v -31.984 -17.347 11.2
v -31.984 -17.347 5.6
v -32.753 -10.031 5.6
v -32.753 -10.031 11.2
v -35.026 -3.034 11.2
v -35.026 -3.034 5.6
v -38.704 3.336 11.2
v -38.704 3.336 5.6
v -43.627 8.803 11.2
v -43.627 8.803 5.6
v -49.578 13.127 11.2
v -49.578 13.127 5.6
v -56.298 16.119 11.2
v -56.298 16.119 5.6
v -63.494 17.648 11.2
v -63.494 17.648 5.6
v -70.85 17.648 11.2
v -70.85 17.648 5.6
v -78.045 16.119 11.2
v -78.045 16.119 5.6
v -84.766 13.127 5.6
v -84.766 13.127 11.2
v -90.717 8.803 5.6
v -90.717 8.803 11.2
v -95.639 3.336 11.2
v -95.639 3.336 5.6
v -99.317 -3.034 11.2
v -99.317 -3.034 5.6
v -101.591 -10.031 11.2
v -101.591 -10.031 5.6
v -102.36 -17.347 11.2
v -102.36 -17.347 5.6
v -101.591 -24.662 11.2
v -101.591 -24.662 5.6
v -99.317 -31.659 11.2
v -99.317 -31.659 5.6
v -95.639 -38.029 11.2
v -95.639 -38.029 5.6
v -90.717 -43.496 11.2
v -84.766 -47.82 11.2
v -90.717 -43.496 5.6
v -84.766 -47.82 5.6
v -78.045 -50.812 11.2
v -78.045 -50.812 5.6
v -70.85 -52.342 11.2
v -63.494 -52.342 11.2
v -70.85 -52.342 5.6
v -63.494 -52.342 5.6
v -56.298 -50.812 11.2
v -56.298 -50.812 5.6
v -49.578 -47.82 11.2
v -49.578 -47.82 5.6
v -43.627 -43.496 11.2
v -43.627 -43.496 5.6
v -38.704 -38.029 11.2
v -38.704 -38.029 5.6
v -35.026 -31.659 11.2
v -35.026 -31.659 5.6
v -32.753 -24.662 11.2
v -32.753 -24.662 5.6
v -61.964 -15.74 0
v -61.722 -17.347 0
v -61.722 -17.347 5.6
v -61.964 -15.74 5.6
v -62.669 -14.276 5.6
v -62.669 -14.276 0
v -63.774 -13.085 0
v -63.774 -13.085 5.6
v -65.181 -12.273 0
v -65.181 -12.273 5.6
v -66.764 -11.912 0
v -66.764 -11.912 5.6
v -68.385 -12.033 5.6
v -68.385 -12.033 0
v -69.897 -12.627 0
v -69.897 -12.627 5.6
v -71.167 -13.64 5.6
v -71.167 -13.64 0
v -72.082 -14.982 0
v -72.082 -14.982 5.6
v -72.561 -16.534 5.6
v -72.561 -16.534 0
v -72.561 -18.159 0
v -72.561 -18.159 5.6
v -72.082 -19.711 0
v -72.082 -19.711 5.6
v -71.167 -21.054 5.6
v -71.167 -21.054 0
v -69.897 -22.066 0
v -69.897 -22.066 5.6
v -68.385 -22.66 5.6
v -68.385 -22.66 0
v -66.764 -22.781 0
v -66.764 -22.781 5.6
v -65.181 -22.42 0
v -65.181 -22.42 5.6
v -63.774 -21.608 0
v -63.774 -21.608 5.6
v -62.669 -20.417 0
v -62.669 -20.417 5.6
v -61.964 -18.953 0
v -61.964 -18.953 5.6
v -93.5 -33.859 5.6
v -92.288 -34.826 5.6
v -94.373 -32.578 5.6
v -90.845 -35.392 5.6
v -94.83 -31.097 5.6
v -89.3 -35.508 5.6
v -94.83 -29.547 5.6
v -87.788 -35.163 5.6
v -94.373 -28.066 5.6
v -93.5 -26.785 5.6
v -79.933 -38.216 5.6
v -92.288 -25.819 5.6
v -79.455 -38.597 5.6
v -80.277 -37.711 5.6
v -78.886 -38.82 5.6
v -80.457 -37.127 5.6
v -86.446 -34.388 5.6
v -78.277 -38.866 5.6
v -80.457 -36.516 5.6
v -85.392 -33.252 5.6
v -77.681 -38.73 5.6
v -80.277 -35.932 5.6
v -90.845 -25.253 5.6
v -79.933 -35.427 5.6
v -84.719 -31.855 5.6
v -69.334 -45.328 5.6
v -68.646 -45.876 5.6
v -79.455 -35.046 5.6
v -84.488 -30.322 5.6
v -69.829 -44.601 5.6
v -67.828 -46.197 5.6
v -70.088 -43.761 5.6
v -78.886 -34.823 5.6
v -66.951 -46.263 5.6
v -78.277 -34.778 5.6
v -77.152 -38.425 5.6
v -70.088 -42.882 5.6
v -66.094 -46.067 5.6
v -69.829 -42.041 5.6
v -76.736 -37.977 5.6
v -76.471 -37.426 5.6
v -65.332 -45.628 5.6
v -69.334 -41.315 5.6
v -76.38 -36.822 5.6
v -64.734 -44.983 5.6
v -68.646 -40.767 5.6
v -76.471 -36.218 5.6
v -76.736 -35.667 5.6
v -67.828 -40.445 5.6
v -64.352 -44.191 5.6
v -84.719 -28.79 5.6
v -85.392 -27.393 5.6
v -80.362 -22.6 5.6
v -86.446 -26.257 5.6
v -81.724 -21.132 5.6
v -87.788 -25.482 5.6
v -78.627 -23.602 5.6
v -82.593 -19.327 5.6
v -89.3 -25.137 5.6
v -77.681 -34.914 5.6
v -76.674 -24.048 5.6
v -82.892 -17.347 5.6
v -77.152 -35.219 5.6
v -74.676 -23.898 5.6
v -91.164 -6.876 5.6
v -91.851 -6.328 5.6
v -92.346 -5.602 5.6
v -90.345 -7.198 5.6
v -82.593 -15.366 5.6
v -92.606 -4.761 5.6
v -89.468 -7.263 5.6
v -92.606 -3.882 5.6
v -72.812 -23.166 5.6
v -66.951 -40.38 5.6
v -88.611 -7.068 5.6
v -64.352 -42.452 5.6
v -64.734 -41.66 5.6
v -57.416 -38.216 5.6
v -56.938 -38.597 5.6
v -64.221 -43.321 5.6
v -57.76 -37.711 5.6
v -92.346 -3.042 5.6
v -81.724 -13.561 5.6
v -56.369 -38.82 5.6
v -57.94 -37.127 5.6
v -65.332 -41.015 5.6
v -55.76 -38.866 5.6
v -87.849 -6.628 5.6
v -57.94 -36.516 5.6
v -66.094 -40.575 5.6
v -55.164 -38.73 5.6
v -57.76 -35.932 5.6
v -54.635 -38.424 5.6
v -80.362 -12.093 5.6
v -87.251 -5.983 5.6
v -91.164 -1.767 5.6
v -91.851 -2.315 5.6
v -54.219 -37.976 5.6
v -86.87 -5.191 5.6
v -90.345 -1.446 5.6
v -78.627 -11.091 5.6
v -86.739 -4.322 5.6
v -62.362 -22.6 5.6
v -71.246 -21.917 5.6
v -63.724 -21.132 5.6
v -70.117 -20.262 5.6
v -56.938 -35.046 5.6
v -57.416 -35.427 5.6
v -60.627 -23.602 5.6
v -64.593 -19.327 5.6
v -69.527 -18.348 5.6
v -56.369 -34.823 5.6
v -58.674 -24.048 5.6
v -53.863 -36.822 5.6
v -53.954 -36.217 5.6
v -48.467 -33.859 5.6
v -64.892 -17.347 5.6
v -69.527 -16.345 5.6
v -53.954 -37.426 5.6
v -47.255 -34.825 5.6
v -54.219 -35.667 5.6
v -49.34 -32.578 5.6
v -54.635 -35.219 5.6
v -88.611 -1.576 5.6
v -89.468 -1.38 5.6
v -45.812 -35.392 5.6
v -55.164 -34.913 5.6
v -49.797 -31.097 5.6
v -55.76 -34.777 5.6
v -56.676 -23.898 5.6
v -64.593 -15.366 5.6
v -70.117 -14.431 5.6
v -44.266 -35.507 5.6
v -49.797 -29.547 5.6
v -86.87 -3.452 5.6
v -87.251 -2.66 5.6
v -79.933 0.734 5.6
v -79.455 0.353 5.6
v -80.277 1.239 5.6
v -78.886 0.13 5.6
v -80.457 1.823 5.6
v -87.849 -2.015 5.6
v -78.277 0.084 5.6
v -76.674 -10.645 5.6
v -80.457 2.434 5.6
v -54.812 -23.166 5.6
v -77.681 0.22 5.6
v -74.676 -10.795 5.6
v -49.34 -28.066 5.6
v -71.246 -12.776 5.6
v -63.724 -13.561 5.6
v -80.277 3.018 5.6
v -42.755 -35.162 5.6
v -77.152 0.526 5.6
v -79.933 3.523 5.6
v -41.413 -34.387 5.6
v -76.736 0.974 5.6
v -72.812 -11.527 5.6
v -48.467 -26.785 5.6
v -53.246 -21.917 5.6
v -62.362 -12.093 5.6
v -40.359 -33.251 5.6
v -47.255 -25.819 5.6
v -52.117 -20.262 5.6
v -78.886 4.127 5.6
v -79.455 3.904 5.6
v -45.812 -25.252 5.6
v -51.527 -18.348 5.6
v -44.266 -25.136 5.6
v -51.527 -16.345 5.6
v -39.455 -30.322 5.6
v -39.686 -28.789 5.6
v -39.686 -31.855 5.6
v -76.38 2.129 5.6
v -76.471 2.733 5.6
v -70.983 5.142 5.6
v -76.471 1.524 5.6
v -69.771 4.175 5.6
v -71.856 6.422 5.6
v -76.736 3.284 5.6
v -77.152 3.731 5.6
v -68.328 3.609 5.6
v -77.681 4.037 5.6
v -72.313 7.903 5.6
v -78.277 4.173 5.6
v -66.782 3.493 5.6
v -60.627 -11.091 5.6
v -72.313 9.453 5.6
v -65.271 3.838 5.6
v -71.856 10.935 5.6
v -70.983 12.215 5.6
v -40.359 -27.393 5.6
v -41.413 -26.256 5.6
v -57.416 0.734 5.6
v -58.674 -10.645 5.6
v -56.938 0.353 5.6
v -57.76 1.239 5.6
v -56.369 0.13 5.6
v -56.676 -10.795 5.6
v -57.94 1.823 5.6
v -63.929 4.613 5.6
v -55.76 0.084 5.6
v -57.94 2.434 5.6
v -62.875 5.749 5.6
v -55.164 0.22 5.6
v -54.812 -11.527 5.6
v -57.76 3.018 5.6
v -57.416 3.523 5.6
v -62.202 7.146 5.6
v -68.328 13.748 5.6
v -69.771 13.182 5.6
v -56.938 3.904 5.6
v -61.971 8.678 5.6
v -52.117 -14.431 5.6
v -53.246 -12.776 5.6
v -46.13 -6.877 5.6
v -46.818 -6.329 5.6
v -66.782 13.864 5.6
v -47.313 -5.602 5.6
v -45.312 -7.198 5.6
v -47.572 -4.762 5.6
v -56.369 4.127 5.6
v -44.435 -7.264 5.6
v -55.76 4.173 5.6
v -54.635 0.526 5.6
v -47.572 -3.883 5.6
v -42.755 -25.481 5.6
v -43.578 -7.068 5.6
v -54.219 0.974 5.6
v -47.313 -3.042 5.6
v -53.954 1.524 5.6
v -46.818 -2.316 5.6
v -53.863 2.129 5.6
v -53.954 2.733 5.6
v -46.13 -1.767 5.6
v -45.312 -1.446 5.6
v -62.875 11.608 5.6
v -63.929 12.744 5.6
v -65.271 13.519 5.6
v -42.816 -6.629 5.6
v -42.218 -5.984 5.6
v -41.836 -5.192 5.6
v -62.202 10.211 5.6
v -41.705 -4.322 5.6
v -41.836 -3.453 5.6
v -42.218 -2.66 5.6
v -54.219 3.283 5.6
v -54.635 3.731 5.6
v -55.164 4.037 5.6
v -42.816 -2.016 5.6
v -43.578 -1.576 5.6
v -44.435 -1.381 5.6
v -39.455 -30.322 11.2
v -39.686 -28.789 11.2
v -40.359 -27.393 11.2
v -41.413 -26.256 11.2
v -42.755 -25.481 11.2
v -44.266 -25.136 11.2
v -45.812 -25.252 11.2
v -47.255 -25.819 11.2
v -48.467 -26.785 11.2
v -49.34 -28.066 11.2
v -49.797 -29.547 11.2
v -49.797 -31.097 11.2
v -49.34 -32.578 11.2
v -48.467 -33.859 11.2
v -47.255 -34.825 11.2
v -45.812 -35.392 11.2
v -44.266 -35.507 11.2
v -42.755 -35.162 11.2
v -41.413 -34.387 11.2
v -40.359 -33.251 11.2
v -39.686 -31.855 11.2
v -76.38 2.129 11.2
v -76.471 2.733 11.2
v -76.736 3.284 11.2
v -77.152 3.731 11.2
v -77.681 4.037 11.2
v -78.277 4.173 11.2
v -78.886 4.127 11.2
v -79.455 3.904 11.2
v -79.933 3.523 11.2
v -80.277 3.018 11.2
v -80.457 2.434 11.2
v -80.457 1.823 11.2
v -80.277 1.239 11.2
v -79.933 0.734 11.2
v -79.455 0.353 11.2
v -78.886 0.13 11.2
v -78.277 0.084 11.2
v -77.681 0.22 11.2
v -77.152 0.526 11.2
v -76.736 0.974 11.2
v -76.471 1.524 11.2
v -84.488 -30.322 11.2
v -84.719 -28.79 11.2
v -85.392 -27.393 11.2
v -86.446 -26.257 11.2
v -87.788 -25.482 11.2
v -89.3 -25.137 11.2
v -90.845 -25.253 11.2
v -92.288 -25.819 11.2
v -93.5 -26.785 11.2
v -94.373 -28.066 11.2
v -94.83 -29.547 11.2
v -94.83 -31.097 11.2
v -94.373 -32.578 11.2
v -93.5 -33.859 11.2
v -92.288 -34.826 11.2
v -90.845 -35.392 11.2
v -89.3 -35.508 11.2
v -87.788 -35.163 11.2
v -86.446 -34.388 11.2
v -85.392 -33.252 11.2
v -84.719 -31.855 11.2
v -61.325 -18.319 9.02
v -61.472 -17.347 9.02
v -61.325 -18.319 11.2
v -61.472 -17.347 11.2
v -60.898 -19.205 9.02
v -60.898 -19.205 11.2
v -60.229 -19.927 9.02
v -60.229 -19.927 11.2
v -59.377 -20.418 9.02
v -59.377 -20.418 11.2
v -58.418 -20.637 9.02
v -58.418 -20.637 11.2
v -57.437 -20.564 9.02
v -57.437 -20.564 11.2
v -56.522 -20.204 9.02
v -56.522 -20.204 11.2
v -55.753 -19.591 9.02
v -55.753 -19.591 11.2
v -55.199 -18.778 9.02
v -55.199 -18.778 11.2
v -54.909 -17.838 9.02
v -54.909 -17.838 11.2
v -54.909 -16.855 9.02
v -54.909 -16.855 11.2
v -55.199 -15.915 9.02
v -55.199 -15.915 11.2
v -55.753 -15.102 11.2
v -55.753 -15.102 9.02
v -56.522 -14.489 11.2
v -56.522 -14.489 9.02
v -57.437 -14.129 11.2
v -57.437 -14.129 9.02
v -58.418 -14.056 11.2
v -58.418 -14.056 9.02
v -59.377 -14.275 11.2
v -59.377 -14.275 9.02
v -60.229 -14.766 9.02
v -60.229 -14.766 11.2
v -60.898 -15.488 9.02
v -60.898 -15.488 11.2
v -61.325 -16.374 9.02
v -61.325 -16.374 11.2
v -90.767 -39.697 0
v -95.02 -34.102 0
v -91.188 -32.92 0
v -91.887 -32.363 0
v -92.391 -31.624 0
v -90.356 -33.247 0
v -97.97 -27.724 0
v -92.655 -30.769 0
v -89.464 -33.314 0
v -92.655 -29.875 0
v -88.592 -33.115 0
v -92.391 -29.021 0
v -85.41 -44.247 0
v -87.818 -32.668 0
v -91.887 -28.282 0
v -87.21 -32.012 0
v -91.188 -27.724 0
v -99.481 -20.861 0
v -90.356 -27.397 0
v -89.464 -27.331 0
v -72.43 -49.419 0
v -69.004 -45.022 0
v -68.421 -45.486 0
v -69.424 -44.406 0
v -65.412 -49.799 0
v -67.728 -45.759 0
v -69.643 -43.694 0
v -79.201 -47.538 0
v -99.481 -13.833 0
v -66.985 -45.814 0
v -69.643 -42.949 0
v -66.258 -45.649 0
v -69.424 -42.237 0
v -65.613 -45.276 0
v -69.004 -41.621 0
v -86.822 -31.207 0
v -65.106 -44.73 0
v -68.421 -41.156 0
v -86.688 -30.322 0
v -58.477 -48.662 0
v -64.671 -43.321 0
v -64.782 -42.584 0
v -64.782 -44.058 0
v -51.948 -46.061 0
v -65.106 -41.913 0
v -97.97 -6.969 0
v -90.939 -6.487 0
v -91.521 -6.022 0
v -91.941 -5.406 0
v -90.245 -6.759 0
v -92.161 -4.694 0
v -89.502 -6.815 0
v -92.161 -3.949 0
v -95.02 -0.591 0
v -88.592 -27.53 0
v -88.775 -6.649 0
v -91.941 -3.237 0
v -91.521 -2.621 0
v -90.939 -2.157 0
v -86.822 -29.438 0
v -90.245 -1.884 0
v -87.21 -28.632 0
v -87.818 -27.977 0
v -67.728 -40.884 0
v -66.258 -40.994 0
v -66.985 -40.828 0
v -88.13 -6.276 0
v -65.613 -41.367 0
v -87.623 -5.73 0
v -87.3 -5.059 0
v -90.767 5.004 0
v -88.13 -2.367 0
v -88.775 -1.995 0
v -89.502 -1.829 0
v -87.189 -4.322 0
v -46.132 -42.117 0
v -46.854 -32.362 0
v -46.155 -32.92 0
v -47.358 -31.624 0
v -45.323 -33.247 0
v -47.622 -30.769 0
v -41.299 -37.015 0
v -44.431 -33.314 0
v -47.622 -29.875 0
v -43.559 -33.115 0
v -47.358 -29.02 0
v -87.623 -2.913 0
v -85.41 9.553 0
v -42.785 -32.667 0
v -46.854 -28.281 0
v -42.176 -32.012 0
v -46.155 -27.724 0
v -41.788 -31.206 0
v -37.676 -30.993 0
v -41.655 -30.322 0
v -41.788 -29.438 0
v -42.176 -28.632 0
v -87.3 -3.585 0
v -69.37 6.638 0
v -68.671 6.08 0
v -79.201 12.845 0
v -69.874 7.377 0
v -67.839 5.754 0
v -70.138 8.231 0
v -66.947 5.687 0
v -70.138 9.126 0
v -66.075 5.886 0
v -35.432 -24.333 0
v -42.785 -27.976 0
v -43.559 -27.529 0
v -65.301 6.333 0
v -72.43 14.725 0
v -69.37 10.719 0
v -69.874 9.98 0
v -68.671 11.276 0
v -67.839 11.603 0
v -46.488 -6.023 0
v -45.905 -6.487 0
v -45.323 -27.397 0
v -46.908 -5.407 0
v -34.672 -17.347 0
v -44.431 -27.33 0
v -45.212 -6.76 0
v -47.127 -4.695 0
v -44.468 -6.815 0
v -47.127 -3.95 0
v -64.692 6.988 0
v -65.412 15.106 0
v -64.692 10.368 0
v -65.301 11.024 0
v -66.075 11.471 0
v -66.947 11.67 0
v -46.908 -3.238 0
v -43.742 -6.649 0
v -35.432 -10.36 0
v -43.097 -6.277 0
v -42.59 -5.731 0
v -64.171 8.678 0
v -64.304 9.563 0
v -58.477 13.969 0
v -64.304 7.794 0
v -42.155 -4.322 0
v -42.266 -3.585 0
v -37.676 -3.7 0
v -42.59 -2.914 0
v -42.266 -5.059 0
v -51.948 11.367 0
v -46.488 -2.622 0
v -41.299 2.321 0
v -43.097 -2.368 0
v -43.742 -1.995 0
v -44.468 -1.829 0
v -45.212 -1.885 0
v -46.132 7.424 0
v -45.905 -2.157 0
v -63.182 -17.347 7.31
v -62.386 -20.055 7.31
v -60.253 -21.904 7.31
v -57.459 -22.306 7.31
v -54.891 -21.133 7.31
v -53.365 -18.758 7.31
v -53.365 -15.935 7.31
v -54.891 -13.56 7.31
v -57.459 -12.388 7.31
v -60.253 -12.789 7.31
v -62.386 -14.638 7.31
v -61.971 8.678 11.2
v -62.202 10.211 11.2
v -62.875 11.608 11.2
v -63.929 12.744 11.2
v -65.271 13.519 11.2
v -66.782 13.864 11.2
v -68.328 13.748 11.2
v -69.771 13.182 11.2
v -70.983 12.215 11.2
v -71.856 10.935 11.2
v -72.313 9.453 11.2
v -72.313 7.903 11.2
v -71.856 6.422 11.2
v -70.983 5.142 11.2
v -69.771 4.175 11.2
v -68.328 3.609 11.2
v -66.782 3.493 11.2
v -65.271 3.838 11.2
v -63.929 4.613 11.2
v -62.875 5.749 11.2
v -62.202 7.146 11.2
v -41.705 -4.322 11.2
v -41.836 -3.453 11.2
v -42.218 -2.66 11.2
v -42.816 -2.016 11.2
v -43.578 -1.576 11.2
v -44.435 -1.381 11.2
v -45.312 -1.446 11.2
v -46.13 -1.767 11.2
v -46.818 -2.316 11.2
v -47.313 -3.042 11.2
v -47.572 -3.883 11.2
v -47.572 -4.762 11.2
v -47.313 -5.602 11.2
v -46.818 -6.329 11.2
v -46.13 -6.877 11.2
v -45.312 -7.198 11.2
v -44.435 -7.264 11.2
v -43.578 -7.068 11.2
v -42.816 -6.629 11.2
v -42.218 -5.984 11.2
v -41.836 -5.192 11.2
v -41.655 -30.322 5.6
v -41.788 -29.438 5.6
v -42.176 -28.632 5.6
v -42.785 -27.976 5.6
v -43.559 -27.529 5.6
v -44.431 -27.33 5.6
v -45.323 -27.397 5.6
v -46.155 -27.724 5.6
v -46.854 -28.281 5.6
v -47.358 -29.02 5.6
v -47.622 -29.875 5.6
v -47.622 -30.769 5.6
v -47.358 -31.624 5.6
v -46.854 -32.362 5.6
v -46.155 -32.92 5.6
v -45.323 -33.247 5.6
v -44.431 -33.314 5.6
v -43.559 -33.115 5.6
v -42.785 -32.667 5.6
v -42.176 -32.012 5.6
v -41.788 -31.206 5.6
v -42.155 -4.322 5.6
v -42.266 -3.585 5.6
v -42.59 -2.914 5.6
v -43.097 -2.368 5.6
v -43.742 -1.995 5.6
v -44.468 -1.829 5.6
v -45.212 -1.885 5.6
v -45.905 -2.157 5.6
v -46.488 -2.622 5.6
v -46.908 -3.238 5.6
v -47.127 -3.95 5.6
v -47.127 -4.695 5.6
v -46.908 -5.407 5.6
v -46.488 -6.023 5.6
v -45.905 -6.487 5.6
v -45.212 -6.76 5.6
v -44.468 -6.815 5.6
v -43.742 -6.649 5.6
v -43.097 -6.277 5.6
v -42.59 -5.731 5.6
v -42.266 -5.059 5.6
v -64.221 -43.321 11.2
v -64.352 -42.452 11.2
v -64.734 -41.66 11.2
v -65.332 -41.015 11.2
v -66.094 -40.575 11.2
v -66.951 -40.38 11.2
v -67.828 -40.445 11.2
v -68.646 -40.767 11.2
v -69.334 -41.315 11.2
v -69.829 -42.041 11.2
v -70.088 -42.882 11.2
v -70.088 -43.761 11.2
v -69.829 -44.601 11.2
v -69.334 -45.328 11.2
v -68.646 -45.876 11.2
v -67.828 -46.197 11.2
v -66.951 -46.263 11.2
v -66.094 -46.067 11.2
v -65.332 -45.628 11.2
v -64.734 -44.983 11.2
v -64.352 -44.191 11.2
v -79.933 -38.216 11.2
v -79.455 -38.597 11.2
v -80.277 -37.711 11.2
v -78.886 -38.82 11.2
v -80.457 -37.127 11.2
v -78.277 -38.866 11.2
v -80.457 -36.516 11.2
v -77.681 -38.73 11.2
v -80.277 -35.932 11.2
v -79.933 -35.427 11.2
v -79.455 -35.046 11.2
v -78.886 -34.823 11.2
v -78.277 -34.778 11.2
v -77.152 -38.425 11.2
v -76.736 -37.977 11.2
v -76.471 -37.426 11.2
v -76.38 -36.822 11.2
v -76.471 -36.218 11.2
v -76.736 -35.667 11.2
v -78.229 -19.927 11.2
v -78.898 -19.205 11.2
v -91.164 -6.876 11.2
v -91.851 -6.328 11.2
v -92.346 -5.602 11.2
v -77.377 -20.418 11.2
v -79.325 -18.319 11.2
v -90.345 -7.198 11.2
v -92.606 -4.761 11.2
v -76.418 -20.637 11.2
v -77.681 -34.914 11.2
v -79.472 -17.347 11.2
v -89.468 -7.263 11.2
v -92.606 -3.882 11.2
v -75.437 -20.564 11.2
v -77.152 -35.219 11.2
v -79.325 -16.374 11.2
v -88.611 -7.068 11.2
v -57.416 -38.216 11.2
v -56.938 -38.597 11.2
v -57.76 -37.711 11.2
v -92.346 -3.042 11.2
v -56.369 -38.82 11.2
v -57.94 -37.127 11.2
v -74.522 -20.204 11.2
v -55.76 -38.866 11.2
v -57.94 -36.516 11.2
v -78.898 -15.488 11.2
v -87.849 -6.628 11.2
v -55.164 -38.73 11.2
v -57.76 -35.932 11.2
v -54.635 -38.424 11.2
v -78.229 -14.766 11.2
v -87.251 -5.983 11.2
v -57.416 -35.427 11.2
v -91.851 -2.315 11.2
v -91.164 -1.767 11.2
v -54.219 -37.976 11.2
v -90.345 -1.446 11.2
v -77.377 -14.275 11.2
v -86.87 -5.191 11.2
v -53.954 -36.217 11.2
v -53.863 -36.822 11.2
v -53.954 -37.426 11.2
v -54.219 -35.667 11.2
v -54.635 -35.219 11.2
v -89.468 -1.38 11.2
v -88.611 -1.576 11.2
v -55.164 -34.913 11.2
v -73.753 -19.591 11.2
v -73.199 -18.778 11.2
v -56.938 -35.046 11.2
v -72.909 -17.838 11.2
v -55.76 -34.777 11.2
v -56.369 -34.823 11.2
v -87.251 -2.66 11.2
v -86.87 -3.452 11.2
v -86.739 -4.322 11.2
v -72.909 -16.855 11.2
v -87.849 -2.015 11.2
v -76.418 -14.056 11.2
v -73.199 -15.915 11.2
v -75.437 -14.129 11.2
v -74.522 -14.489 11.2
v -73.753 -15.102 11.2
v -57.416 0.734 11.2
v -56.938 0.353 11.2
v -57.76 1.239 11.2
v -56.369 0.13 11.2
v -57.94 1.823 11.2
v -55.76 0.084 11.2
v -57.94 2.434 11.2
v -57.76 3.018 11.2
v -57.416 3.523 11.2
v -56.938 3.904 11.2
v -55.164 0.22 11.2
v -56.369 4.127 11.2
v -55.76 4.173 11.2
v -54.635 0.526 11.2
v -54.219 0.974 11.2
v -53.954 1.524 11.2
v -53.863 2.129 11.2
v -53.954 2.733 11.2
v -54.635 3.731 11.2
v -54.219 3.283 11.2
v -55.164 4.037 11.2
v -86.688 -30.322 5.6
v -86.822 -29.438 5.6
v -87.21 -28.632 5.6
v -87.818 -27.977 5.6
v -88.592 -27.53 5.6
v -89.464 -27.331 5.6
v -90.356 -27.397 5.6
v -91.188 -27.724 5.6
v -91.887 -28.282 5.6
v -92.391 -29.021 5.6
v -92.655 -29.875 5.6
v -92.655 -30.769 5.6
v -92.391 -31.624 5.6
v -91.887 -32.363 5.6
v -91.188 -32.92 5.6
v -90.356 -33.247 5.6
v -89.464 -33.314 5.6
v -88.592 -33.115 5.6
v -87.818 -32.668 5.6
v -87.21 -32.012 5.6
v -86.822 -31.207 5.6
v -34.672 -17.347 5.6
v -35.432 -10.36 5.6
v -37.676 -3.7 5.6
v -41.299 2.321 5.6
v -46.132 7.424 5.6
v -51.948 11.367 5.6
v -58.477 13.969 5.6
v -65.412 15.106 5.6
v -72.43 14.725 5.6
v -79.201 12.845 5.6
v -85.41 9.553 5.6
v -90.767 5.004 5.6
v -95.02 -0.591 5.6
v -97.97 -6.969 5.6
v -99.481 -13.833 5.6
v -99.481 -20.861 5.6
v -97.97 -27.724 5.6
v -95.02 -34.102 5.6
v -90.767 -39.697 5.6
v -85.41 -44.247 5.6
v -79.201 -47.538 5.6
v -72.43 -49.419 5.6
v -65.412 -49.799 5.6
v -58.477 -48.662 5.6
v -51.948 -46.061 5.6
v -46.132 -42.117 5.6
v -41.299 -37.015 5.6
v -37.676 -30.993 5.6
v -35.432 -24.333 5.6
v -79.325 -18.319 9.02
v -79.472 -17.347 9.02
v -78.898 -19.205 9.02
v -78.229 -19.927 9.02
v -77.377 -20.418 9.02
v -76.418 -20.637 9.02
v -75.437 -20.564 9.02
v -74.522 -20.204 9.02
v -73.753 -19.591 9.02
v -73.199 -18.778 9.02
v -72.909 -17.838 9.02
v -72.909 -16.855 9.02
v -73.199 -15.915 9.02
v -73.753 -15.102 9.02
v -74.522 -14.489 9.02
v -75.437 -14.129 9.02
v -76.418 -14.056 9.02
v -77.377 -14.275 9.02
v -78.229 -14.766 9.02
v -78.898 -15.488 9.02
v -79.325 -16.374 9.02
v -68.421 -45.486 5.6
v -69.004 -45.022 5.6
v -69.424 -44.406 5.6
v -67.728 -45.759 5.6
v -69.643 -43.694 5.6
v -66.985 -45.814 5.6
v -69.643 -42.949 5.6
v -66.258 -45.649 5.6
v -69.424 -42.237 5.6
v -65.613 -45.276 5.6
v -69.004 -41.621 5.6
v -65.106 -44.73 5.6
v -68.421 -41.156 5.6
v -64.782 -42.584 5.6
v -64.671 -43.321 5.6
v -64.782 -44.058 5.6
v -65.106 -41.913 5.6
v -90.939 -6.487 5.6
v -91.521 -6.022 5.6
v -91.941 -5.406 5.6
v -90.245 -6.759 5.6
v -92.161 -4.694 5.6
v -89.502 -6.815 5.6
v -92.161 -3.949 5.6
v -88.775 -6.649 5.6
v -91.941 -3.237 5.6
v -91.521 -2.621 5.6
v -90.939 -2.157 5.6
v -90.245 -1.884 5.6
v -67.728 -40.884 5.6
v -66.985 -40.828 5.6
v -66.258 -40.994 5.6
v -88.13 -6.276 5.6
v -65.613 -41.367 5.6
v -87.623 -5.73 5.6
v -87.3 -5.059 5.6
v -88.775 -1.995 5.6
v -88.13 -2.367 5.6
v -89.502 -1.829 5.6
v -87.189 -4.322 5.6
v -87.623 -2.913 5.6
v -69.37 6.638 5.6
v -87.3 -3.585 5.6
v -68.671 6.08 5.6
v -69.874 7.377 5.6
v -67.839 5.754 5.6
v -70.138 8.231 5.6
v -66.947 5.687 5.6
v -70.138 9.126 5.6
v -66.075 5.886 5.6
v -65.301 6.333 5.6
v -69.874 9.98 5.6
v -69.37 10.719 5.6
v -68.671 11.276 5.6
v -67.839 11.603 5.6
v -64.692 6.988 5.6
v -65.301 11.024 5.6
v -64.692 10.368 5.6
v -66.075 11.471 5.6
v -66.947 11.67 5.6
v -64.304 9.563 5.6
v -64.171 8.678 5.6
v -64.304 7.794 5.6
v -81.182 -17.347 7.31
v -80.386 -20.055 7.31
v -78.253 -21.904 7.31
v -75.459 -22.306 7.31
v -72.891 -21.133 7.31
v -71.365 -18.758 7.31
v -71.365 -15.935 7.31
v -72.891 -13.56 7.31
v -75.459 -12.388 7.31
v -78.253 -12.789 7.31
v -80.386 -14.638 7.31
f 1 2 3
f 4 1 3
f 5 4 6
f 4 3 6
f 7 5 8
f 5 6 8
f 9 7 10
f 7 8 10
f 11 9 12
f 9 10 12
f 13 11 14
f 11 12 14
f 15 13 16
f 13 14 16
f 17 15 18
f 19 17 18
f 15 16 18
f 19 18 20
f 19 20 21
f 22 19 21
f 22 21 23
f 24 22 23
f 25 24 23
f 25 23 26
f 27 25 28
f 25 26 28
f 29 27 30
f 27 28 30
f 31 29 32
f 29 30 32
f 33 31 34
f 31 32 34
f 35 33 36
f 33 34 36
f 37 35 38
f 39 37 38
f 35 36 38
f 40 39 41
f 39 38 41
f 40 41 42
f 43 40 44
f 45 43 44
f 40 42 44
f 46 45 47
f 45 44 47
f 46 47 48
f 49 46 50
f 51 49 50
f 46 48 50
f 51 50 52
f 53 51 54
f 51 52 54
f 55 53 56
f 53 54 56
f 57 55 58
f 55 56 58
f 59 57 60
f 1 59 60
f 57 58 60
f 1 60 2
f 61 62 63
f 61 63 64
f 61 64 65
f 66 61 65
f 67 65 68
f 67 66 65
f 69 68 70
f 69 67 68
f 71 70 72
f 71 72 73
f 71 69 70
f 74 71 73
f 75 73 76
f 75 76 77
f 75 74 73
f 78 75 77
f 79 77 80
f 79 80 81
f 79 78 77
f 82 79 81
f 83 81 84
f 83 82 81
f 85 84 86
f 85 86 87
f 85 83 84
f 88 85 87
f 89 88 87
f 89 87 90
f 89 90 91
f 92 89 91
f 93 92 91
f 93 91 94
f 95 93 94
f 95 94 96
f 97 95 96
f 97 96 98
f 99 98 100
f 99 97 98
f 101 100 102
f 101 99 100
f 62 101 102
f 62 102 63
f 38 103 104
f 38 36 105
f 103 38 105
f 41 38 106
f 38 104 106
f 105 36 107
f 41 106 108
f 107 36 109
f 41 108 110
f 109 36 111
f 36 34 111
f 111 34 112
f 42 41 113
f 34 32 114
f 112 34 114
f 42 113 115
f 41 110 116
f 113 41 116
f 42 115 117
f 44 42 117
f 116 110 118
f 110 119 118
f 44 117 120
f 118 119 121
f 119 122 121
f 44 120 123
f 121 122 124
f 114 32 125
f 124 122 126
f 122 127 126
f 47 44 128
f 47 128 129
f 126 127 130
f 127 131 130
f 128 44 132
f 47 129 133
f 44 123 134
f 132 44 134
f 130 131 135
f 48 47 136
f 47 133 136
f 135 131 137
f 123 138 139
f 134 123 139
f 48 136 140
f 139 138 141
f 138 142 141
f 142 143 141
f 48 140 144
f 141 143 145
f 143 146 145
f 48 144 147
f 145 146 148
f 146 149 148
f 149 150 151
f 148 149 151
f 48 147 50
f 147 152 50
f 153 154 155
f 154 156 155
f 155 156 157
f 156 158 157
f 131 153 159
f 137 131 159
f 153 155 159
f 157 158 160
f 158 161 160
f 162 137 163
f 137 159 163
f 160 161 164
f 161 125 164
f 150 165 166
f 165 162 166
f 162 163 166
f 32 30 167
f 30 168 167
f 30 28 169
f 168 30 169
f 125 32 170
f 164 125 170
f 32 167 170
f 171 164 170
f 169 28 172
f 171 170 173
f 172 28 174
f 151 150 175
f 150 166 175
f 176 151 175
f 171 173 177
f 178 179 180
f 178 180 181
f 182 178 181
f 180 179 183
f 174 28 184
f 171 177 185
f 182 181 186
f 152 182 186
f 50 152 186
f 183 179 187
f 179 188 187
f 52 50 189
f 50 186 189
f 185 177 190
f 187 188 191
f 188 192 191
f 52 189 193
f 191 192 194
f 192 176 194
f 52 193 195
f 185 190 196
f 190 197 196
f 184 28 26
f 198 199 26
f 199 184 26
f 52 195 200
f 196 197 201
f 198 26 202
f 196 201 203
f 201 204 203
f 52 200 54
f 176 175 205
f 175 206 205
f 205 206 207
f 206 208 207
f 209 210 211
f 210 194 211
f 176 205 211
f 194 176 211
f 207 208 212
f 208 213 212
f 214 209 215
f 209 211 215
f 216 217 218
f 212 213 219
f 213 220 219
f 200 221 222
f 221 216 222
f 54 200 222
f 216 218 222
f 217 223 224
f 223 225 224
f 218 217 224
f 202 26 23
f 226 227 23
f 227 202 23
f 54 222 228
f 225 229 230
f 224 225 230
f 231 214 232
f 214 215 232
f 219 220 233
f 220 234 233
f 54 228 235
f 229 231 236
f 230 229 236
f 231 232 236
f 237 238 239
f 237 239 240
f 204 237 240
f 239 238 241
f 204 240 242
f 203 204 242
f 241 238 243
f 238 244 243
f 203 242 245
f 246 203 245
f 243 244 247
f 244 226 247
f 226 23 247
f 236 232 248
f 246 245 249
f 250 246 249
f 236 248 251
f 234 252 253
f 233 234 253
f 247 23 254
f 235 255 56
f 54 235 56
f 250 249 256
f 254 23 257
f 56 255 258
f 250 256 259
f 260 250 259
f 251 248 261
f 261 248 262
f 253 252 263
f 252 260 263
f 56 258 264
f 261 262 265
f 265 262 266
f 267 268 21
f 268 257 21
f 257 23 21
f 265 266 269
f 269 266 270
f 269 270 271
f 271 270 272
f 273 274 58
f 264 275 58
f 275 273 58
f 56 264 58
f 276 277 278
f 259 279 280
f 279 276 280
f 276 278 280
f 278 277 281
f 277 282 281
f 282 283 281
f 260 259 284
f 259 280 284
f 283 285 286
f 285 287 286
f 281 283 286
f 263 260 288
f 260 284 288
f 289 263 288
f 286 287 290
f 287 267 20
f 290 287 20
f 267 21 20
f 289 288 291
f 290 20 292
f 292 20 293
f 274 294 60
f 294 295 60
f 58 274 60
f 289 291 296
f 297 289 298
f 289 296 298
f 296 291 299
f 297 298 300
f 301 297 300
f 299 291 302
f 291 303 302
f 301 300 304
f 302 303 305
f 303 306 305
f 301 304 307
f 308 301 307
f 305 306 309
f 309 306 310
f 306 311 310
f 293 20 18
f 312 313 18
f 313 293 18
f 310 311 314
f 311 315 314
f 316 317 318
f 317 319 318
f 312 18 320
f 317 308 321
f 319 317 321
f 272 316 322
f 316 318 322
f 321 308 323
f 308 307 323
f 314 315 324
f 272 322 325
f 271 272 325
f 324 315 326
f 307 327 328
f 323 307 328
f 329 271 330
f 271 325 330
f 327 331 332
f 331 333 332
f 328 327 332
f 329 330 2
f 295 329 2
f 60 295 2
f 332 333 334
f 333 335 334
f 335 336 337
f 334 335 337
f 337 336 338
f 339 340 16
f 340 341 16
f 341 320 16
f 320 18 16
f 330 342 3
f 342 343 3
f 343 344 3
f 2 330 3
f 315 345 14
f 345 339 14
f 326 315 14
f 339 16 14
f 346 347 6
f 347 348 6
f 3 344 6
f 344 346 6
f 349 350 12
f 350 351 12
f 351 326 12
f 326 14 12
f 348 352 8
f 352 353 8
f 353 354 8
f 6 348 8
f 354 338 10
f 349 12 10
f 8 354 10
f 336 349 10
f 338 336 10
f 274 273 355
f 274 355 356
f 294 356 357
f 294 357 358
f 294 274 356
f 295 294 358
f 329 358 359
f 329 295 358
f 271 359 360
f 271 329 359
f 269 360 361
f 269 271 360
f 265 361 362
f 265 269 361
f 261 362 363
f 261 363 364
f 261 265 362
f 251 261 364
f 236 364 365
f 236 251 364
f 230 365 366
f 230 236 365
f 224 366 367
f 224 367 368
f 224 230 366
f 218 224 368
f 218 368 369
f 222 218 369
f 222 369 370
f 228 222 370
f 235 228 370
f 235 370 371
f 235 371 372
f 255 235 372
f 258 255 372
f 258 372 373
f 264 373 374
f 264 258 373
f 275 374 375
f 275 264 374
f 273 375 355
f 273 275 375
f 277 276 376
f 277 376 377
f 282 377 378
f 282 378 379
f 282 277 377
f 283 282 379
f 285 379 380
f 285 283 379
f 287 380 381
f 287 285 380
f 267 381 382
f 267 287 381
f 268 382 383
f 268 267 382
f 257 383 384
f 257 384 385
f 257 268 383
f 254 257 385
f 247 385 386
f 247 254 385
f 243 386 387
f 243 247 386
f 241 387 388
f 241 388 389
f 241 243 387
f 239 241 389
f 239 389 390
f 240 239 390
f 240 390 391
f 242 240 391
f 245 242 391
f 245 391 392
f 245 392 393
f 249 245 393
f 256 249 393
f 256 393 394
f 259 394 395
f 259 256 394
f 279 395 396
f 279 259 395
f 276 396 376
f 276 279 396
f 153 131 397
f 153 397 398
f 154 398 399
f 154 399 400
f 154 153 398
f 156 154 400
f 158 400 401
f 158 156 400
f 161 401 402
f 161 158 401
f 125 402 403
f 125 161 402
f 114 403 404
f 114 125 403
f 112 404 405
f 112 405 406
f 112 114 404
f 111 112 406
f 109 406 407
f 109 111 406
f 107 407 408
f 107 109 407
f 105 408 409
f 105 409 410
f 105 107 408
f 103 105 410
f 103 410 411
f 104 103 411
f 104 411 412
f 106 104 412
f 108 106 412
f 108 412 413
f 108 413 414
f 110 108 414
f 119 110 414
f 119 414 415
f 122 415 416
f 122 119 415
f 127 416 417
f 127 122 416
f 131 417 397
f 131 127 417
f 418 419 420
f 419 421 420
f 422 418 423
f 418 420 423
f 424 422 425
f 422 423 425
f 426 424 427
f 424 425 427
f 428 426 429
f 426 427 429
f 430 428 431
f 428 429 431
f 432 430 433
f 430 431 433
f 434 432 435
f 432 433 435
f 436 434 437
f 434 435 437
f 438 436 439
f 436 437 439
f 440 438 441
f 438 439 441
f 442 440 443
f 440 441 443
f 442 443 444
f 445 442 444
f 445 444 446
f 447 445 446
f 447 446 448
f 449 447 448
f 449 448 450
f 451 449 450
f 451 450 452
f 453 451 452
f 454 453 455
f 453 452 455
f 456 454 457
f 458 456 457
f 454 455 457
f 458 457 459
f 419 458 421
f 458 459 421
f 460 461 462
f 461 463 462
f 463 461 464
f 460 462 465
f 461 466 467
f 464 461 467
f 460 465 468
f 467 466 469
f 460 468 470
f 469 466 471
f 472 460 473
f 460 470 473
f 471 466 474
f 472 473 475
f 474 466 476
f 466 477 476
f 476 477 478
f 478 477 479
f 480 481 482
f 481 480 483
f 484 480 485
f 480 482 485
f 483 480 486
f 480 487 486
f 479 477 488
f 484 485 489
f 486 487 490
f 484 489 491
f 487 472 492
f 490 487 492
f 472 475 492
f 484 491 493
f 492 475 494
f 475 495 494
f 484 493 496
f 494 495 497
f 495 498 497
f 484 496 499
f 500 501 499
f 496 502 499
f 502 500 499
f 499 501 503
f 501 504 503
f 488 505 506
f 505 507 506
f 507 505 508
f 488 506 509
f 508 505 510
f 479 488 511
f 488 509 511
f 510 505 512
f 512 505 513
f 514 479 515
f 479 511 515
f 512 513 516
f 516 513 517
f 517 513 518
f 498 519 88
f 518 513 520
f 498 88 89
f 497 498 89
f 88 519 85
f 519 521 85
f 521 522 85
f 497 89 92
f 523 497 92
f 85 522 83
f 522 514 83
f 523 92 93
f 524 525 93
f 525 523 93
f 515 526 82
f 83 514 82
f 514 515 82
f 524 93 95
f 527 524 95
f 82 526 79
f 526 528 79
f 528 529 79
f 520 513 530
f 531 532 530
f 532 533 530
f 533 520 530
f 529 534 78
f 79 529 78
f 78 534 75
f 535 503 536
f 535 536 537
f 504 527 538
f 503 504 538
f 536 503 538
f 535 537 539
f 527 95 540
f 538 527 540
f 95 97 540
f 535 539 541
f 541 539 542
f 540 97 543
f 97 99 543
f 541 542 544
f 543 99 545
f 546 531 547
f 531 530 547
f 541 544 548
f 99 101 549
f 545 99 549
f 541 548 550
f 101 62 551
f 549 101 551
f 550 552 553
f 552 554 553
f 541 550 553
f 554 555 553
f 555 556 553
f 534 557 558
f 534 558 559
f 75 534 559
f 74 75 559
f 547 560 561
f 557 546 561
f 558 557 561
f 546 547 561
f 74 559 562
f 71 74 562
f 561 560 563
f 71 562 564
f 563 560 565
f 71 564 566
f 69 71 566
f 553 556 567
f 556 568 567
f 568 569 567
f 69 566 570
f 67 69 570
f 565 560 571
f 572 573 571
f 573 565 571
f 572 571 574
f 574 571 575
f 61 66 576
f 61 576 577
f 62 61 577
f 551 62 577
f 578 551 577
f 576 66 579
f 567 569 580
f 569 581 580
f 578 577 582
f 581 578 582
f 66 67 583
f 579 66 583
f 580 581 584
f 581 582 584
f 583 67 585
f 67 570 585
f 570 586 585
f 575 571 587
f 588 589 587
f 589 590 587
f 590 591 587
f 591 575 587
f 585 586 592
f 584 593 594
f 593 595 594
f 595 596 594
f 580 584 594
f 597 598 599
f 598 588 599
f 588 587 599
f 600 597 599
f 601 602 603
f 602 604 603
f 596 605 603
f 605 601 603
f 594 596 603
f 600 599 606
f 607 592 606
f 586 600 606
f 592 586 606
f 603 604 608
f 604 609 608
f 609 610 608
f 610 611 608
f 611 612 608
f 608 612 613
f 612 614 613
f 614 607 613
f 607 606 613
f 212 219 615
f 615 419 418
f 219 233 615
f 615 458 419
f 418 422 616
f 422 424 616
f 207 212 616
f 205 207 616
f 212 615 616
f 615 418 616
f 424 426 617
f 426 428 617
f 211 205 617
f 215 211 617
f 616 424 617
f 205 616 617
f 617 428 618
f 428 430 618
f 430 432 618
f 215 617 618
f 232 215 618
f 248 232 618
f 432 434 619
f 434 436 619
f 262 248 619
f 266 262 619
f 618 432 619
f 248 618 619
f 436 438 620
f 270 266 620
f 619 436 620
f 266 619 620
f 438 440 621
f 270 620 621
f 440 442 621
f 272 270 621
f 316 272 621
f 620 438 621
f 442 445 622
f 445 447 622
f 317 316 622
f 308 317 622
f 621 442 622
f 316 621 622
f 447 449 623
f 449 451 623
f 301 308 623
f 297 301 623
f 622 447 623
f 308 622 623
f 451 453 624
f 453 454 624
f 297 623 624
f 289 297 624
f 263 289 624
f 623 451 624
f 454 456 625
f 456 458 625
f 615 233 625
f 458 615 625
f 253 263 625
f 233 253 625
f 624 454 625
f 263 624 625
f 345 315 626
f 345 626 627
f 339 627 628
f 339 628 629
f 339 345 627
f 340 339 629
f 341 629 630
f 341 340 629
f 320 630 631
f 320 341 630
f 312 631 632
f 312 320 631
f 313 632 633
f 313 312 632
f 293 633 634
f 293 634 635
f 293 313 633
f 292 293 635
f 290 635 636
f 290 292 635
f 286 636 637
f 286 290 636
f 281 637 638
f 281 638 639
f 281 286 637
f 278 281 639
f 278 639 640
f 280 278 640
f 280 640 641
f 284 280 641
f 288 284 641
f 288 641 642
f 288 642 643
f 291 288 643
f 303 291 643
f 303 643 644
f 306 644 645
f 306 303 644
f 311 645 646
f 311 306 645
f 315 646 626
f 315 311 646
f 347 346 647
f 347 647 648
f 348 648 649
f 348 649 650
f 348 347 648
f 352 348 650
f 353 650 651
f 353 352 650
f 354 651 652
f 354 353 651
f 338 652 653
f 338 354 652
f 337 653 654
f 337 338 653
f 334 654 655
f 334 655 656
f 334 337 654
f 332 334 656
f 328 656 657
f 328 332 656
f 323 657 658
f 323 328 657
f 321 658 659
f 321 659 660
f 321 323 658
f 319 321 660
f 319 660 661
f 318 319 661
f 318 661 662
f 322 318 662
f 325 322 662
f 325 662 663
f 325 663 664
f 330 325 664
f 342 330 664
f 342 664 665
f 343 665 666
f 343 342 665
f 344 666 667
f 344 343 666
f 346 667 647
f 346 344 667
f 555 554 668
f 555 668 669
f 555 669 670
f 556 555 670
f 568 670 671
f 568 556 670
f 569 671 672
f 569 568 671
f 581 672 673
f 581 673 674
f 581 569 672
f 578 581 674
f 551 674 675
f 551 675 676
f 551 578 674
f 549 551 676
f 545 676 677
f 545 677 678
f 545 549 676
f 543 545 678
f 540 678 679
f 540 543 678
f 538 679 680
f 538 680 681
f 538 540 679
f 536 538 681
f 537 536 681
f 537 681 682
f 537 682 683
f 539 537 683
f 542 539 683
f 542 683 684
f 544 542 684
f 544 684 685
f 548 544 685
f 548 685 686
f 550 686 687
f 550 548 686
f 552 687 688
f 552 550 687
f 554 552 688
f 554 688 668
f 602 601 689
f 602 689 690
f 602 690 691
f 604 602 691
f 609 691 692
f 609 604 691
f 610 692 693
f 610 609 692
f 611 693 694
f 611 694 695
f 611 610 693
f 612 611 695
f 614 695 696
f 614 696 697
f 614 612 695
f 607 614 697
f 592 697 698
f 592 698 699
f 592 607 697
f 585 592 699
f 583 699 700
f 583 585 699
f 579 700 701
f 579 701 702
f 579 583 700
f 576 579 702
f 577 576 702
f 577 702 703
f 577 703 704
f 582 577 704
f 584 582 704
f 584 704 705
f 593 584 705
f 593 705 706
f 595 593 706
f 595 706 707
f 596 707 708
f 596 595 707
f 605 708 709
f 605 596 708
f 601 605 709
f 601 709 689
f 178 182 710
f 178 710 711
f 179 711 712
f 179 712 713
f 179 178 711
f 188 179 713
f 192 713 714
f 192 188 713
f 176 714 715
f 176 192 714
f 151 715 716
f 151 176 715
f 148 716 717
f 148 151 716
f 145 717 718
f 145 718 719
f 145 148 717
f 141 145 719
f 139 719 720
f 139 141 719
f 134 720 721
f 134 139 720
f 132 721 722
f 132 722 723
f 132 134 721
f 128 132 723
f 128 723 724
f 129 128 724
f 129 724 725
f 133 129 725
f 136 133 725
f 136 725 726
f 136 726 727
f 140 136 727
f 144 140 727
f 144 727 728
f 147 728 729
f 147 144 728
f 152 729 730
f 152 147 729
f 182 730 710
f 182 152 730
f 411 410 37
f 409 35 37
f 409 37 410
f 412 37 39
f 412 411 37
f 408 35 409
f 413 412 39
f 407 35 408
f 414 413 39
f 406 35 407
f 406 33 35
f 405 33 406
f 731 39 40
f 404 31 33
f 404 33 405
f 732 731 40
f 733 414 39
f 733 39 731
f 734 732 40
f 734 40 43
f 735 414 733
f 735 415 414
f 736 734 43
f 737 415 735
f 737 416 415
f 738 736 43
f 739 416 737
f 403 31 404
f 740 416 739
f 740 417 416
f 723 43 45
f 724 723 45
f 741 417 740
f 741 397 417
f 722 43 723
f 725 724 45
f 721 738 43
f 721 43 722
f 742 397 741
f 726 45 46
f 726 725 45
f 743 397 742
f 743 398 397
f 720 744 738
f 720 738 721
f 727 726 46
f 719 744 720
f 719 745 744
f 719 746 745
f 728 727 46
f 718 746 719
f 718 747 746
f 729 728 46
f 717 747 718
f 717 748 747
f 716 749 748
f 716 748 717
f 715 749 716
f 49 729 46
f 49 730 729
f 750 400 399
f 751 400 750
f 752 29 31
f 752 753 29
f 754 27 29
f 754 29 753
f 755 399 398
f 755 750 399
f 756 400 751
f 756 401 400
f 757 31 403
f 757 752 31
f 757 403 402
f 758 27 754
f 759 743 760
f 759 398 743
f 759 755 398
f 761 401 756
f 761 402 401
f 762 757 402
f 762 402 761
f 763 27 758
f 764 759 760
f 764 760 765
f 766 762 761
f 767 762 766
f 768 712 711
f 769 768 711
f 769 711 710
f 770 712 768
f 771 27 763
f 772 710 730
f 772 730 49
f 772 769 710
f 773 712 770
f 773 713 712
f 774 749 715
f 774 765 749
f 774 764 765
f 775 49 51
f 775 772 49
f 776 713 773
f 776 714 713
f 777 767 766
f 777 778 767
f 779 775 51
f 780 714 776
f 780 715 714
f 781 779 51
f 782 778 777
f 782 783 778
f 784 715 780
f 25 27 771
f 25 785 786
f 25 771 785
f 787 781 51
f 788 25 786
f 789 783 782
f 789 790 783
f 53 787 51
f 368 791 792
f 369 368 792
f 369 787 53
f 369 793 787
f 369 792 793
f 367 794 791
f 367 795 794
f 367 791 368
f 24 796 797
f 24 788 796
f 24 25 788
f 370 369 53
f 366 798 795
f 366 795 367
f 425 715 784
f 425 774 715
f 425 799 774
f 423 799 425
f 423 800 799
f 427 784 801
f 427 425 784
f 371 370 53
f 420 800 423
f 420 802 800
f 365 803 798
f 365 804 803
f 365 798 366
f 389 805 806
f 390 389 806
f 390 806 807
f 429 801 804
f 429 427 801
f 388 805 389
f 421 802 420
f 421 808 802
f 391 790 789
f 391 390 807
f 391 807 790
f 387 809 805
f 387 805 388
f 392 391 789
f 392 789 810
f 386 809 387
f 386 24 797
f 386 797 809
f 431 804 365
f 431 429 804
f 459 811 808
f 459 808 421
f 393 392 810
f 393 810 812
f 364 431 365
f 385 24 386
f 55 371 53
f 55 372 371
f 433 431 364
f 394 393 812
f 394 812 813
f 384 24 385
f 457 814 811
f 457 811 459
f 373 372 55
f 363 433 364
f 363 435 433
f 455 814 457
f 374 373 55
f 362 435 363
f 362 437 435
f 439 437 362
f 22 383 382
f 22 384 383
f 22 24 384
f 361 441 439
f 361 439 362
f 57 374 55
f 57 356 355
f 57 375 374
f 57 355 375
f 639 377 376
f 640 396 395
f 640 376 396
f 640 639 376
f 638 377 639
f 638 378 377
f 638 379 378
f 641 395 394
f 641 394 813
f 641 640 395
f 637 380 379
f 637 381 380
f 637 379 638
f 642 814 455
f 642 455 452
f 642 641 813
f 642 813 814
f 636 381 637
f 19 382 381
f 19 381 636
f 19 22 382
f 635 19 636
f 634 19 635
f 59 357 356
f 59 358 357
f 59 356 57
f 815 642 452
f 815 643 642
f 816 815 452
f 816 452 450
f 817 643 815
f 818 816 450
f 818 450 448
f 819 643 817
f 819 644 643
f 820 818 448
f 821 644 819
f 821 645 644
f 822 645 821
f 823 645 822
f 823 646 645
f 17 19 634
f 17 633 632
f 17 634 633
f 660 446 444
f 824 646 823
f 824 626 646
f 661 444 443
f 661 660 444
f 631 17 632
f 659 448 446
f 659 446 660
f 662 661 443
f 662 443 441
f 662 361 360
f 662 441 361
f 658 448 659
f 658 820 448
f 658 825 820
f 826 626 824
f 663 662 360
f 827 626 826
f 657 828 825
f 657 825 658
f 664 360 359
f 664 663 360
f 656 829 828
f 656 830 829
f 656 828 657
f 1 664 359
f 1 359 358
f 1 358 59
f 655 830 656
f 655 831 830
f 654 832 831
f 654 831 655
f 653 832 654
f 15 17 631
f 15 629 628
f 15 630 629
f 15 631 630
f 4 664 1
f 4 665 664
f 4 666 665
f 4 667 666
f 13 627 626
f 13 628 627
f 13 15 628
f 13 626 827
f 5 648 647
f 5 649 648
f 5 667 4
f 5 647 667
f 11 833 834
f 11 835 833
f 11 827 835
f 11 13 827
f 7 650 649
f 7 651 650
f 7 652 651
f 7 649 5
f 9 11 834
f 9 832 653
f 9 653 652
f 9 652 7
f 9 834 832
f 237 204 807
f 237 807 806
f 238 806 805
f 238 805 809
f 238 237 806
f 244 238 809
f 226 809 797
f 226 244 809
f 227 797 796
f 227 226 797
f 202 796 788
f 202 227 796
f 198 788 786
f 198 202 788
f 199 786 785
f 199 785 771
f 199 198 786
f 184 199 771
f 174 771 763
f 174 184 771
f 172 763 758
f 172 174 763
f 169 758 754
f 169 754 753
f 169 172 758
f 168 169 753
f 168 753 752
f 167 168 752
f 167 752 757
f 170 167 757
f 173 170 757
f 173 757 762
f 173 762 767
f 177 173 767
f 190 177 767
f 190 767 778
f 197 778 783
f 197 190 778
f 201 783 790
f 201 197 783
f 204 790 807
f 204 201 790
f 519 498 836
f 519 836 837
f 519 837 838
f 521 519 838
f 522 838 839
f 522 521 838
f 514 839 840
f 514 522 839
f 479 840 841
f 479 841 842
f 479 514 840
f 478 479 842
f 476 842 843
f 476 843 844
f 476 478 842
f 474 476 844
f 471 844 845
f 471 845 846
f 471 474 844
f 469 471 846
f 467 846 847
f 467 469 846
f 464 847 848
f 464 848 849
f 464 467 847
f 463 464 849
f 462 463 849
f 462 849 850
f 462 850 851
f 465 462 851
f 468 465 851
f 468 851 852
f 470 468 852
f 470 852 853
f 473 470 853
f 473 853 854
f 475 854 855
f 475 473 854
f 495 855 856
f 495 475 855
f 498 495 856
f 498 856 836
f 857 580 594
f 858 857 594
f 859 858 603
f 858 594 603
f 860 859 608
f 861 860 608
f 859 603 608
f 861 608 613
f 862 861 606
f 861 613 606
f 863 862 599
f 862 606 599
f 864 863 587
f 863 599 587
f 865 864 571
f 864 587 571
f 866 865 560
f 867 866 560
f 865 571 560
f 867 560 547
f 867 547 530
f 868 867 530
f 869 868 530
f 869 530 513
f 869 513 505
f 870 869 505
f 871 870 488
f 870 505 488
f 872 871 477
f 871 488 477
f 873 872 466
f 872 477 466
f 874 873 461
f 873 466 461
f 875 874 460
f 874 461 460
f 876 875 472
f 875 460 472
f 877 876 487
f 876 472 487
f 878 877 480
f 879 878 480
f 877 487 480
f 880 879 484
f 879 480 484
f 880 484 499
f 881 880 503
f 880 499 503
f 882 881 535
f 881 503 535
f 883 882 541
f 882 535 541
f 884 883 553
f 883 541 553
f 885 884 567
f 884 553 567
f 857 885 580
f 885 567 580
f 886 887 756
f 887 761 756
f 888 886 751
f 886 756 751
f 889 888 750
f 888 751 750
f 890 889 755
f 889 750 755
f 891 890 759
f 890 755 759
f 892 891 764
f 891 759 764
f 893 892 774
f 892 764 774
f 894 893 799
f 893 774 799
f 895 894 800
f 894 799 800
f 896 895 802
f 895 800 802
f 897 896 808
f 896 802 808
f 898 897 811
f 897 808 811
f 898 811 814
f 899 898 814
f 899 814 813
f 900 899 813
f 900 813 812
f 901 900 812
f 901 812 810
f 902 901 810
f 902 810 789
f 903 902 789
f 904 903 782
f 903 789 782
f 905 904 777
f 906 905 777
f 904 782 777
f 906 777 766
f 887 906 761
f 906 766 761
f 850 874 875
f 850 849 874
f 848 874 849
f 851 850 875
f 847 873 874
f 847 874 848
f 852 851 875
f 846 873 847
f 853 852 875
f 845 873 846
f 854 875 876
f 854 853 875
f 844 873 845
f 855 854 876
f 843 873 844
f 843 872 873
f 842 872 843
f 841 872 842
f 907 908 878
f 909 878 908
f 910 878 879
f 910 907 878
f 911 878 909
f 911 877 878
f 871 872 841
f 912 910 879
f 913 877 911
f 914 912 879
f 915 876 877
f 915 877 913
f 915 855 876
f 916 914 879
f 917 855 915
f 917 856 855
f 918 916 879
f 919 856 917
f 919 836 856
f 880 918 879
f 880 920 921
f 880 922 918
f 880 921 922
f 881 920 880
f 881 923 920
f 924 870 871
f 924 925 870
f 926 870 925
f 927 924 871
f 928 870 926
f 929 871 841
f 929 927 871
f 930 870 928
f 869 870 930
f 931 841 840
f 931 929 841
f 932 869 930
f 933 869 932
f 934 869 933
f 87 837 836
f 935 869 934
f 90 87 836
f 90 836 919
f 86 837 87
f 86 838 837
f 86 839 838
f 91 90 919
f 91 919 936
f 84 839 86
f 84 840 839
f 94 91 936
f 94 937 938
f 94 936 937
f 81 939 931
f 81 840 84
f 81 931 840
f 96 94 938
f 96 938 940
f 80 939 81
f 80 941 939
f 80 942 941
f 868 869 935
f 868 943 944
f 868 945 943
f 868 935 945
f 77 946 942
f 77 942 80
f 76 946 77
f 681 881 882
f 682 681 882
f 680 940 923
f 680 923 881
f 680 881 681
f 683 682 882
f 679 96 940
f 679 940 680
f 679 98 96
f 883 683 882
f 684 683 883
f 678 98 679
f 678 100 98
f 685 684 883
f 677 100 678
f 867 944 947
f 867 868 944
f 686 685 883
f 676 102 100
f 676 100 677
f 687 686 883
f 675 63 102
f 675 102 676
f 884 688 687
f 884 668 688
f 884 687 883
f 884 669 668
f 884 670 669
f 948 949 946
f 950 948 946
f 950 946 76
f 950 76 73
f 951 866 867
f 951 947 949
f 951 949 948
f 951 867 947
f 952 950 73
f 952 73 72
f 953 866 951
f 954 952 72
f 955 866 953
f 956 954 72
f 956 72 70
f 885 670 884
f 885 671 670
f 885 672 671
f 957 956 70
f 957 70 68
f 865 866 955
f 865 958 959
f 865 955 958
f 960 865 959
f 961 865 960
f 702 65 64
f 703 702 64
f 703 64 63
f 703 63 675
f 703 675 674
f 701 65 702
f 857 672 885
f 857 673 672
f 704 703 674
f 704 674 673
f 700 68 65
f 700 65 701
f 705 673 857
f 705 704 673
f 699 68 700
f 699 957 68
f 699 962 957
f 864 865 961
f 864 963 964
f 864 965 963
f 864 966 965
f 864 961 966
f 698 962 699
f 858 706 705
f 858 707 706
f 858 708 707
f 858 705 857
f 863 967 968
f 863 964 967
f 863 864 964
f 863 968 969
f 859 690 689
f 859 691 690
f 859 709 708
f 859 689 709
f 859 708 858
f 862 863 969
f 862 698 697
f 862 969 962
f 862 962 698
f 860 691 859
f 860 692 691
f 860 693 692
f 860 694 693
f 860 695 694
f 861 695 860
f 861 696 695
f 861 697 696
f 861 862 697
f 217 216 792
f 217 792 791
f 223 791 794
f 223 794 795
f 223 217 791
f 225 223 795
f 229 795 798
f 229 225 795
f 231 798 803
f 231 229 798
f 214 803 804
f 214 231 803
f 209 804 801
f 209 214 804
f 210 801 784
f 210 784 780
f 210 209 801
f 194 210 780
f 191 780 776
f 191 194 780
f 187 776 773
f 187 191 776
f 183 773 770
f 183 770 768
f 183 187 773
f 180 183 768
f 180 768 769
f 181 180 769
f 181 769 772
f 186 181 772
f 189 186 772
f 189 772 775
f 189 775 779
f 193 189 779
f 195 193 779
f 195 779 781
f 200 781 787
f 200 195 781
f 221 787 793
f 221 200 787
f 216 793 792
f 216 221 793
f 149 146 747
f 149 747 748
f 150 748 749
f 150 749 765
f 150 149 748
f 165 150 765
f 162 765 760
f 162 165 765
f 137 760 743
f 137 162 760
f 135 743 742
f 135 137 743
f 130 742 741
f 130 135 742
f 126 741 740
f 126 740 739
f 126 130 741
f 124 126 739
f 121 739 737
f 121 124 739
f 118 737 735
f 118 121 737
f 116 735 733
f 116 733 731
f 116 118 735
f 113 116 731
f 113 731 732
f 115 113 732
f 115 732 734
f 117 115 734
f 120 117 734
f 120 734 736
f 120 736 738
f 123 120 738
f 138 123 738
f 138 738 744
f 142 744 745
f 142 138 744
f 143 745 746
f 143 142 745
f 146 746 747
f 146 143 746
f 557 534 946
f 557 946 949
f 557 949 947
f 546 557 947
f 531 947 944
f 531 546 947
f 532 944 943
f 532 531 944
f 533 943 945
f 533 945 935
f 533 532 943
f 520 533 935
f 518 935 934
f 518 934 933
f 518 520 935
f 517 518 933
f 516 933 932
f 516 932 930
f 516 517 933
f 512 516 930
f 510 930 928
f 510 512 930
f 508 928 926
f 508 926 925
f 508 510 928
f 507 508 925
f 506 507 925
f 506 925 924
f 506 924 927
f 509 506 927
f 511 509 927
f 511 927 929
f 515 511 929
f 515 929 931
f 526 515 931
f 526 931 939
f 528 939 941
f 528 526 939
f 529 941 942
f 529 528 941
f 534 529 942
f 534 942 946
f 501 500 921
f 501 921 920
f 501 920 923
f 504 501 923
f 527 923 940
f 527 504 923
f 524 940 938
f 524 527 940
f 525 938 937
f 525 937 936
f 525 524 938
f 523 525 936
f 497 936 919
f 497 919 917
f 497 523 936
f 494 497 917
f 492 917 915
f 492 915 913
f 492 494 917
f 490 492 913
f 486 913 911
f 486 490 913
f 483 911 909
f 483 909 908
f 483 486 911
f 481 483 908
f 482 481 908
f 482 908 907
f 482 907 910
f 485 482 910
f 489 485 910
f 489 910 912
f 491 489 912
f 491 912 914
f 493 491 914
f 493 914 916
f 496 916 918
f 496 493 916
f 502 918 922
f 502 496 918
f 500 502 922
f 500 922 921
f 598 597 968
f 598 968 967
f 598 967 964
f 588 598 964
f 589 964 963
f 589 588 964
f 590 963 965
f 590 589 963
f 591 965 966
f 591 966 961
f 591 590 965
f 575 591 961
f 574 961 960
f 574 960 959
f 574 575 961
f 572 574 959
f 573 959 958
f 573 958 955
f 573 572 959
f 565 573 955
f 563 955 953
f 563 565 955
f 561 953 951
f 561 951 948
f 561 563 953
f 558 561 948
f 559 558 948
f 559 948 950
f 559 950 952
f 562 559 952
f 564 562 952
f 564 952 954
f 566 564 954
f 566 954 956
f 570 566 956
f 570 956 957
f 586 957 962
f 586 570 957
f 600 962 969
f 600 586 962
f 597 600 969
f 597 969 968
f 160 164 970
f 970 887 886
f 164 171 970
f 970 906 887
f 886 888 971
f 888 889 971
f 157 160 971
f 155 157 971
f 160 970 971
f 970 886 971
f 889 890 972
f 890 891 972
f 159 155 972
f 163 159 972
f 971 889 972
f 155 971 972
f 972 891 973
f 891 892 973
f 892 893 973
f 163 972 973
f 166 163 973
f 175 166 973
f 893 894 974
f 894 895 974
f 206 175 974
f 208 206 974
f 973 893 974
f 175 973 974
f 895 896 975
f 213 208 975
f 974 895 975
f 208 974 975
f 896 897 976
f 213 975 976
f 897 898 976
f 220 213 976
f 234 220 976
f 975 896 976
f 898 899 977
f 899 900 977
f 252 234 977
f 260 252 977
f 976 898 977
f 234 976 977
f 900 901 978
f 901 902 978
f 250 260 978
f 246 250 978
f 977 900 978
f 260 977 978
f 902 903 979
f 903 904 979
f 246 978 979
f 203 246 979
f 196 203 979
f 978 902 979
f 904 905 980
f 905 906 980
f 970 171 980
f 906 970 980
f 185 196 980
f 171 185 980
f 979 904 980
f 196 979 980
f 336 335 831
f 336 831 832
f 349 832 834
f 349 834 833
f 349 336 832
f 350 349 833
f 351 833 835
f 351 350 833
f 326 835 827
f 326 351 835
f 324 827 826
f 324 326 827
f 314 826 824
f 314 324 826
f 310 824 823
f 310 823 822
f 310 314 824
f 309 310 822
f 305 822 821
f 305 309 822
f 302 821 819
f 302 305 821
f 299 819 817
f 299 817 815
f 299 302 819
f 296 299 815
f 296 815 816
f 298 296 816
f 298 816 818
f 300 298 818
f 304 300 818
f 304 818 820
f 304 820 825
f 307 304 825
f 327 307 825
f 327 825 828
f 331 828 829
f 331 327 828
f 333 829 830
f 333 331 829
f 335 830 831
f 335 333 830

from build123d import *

# Parameters (mm, degrees)
F0_R           = 32.499997
F0_R_2         = 3
F0_R_3         = 2.5
F0_R_4         = 5.450141
F1_DEPTH       = 5.6
F2_R           = 35.1877607124
F2_R_2         = 2.05
F2_R_3         = 5.2
F2_R_4         = 2.95
F3_DEPTH       = 5.6
F5_D           = 6.6
F5_CSINK_D     = 13.44
F5_CSINK_ANGLE = 90


with BuildPart() as f1:
    # F0 (on Top) → F1 (new body)
    with BuildSketch(Plane.XY):
        with Locations((-67.1717547521, -17.3467109513)):
            Circle(F0_R)
        with Locations((-89.6882567521, -30.3222589513)):
            Circle(F0_R_2, mode=Mode.SUBTRACT)
        with Locations((-67.1714107521, -43.3213519513)):
            Circle(F0_R_3, mode=Mode.SUBTRACT)
        with Locations((-44.6550417521, -30.3219509513)):
            Circle(F0_R_2, mode=Mode.SUBTRACT)
        with Locations((-89.6886247521, -4.3216849513)):
            Circle(F0_R_3, mode=Mode.SUBTRACT)
        with Locations((-67.1717547521, -17.3465379513)):
            Circle(F0_R_4, mode=Mode.SUBTRACT)
        with Locations((-44.6552727521, -4.3222529513)):
            Circle(F0_R_3, mode=Mode.SUBTRACT)
        with Locations((-67.1710657521, 8.6784020487)):
            Circle(F0_R_2, mode=Mode.SUBTRACT)
    extrude(amount=F1_DEPTH)


with BuildPart() as f3:
    # F2 (on face) → F3 (new body)
    with BuildSketch(Plane.XY.offset(5.6)):
        with Locations((-67.1717547521, -17.3465379513)):
            Circle(F2_R)
        with Locations((-78.4298337521, -36.8218054513)):
            Circle(F2_R_2, mode=Mode.SUBTRACT)
        with Locations((-89.6882567521, -30.3222589513)):
            Circle(F2_R_3, mode=Mode.SUBTRACT)
        with Locations((-67.1714107521, -43.3213519513)):
            Circle(F2_R_4, mode=Mode.SUBTRACT)
        with Locations((-55.9132262521, -36.8216514513)):
            Circle(F2_R_2, mode=Mode.SUBTRACT)
        with Locations((-44.6550417521, -30.3219509513)):
            Circle(F2_R_3, mode=Mode.SUBTRACT)
        with Locations((-89.6886247521, -4.3216849513)):
            Circle(F2_R_4, mode=Mode.SUBTRACT)
        with Locations((-78.4298337521, 2.1287295487)):
            Circle(F2_R_2, mode=Mode.SUBTRACT)
        with Locations((-44.6552727521, -4.3222529513)):
            Circle(F2_R_4, mode=Mode.SUBTRACT)
        with Locations((-67.1710657521, 8.6784020487)):
            Circle(F2_R_3, mode=Mode.SUBTRACT)
        with Locations((-55.9132262521, 2.1285755487)):
            Circle(F2_R_2, mode=Mode.SUBTRACT)
    extrude(amount=F3_DEPTH)

    # F5 (through all)
    with Locations(Plane(origin=(0, 0, 5.6), x_dir=(1, 0, 0), z_dir=(0, 0, -1))):
        with Locations((-76.1717547521, 17.3465379513), (-58.1717547521, 17.3465379513)):
            CounterSinkHole(F5_D / 2, F5_CSINK_D / 2, counter_sink_angle=F5_CSINK_ANGLE)


solid = Compound([f1.part, f3.part])
